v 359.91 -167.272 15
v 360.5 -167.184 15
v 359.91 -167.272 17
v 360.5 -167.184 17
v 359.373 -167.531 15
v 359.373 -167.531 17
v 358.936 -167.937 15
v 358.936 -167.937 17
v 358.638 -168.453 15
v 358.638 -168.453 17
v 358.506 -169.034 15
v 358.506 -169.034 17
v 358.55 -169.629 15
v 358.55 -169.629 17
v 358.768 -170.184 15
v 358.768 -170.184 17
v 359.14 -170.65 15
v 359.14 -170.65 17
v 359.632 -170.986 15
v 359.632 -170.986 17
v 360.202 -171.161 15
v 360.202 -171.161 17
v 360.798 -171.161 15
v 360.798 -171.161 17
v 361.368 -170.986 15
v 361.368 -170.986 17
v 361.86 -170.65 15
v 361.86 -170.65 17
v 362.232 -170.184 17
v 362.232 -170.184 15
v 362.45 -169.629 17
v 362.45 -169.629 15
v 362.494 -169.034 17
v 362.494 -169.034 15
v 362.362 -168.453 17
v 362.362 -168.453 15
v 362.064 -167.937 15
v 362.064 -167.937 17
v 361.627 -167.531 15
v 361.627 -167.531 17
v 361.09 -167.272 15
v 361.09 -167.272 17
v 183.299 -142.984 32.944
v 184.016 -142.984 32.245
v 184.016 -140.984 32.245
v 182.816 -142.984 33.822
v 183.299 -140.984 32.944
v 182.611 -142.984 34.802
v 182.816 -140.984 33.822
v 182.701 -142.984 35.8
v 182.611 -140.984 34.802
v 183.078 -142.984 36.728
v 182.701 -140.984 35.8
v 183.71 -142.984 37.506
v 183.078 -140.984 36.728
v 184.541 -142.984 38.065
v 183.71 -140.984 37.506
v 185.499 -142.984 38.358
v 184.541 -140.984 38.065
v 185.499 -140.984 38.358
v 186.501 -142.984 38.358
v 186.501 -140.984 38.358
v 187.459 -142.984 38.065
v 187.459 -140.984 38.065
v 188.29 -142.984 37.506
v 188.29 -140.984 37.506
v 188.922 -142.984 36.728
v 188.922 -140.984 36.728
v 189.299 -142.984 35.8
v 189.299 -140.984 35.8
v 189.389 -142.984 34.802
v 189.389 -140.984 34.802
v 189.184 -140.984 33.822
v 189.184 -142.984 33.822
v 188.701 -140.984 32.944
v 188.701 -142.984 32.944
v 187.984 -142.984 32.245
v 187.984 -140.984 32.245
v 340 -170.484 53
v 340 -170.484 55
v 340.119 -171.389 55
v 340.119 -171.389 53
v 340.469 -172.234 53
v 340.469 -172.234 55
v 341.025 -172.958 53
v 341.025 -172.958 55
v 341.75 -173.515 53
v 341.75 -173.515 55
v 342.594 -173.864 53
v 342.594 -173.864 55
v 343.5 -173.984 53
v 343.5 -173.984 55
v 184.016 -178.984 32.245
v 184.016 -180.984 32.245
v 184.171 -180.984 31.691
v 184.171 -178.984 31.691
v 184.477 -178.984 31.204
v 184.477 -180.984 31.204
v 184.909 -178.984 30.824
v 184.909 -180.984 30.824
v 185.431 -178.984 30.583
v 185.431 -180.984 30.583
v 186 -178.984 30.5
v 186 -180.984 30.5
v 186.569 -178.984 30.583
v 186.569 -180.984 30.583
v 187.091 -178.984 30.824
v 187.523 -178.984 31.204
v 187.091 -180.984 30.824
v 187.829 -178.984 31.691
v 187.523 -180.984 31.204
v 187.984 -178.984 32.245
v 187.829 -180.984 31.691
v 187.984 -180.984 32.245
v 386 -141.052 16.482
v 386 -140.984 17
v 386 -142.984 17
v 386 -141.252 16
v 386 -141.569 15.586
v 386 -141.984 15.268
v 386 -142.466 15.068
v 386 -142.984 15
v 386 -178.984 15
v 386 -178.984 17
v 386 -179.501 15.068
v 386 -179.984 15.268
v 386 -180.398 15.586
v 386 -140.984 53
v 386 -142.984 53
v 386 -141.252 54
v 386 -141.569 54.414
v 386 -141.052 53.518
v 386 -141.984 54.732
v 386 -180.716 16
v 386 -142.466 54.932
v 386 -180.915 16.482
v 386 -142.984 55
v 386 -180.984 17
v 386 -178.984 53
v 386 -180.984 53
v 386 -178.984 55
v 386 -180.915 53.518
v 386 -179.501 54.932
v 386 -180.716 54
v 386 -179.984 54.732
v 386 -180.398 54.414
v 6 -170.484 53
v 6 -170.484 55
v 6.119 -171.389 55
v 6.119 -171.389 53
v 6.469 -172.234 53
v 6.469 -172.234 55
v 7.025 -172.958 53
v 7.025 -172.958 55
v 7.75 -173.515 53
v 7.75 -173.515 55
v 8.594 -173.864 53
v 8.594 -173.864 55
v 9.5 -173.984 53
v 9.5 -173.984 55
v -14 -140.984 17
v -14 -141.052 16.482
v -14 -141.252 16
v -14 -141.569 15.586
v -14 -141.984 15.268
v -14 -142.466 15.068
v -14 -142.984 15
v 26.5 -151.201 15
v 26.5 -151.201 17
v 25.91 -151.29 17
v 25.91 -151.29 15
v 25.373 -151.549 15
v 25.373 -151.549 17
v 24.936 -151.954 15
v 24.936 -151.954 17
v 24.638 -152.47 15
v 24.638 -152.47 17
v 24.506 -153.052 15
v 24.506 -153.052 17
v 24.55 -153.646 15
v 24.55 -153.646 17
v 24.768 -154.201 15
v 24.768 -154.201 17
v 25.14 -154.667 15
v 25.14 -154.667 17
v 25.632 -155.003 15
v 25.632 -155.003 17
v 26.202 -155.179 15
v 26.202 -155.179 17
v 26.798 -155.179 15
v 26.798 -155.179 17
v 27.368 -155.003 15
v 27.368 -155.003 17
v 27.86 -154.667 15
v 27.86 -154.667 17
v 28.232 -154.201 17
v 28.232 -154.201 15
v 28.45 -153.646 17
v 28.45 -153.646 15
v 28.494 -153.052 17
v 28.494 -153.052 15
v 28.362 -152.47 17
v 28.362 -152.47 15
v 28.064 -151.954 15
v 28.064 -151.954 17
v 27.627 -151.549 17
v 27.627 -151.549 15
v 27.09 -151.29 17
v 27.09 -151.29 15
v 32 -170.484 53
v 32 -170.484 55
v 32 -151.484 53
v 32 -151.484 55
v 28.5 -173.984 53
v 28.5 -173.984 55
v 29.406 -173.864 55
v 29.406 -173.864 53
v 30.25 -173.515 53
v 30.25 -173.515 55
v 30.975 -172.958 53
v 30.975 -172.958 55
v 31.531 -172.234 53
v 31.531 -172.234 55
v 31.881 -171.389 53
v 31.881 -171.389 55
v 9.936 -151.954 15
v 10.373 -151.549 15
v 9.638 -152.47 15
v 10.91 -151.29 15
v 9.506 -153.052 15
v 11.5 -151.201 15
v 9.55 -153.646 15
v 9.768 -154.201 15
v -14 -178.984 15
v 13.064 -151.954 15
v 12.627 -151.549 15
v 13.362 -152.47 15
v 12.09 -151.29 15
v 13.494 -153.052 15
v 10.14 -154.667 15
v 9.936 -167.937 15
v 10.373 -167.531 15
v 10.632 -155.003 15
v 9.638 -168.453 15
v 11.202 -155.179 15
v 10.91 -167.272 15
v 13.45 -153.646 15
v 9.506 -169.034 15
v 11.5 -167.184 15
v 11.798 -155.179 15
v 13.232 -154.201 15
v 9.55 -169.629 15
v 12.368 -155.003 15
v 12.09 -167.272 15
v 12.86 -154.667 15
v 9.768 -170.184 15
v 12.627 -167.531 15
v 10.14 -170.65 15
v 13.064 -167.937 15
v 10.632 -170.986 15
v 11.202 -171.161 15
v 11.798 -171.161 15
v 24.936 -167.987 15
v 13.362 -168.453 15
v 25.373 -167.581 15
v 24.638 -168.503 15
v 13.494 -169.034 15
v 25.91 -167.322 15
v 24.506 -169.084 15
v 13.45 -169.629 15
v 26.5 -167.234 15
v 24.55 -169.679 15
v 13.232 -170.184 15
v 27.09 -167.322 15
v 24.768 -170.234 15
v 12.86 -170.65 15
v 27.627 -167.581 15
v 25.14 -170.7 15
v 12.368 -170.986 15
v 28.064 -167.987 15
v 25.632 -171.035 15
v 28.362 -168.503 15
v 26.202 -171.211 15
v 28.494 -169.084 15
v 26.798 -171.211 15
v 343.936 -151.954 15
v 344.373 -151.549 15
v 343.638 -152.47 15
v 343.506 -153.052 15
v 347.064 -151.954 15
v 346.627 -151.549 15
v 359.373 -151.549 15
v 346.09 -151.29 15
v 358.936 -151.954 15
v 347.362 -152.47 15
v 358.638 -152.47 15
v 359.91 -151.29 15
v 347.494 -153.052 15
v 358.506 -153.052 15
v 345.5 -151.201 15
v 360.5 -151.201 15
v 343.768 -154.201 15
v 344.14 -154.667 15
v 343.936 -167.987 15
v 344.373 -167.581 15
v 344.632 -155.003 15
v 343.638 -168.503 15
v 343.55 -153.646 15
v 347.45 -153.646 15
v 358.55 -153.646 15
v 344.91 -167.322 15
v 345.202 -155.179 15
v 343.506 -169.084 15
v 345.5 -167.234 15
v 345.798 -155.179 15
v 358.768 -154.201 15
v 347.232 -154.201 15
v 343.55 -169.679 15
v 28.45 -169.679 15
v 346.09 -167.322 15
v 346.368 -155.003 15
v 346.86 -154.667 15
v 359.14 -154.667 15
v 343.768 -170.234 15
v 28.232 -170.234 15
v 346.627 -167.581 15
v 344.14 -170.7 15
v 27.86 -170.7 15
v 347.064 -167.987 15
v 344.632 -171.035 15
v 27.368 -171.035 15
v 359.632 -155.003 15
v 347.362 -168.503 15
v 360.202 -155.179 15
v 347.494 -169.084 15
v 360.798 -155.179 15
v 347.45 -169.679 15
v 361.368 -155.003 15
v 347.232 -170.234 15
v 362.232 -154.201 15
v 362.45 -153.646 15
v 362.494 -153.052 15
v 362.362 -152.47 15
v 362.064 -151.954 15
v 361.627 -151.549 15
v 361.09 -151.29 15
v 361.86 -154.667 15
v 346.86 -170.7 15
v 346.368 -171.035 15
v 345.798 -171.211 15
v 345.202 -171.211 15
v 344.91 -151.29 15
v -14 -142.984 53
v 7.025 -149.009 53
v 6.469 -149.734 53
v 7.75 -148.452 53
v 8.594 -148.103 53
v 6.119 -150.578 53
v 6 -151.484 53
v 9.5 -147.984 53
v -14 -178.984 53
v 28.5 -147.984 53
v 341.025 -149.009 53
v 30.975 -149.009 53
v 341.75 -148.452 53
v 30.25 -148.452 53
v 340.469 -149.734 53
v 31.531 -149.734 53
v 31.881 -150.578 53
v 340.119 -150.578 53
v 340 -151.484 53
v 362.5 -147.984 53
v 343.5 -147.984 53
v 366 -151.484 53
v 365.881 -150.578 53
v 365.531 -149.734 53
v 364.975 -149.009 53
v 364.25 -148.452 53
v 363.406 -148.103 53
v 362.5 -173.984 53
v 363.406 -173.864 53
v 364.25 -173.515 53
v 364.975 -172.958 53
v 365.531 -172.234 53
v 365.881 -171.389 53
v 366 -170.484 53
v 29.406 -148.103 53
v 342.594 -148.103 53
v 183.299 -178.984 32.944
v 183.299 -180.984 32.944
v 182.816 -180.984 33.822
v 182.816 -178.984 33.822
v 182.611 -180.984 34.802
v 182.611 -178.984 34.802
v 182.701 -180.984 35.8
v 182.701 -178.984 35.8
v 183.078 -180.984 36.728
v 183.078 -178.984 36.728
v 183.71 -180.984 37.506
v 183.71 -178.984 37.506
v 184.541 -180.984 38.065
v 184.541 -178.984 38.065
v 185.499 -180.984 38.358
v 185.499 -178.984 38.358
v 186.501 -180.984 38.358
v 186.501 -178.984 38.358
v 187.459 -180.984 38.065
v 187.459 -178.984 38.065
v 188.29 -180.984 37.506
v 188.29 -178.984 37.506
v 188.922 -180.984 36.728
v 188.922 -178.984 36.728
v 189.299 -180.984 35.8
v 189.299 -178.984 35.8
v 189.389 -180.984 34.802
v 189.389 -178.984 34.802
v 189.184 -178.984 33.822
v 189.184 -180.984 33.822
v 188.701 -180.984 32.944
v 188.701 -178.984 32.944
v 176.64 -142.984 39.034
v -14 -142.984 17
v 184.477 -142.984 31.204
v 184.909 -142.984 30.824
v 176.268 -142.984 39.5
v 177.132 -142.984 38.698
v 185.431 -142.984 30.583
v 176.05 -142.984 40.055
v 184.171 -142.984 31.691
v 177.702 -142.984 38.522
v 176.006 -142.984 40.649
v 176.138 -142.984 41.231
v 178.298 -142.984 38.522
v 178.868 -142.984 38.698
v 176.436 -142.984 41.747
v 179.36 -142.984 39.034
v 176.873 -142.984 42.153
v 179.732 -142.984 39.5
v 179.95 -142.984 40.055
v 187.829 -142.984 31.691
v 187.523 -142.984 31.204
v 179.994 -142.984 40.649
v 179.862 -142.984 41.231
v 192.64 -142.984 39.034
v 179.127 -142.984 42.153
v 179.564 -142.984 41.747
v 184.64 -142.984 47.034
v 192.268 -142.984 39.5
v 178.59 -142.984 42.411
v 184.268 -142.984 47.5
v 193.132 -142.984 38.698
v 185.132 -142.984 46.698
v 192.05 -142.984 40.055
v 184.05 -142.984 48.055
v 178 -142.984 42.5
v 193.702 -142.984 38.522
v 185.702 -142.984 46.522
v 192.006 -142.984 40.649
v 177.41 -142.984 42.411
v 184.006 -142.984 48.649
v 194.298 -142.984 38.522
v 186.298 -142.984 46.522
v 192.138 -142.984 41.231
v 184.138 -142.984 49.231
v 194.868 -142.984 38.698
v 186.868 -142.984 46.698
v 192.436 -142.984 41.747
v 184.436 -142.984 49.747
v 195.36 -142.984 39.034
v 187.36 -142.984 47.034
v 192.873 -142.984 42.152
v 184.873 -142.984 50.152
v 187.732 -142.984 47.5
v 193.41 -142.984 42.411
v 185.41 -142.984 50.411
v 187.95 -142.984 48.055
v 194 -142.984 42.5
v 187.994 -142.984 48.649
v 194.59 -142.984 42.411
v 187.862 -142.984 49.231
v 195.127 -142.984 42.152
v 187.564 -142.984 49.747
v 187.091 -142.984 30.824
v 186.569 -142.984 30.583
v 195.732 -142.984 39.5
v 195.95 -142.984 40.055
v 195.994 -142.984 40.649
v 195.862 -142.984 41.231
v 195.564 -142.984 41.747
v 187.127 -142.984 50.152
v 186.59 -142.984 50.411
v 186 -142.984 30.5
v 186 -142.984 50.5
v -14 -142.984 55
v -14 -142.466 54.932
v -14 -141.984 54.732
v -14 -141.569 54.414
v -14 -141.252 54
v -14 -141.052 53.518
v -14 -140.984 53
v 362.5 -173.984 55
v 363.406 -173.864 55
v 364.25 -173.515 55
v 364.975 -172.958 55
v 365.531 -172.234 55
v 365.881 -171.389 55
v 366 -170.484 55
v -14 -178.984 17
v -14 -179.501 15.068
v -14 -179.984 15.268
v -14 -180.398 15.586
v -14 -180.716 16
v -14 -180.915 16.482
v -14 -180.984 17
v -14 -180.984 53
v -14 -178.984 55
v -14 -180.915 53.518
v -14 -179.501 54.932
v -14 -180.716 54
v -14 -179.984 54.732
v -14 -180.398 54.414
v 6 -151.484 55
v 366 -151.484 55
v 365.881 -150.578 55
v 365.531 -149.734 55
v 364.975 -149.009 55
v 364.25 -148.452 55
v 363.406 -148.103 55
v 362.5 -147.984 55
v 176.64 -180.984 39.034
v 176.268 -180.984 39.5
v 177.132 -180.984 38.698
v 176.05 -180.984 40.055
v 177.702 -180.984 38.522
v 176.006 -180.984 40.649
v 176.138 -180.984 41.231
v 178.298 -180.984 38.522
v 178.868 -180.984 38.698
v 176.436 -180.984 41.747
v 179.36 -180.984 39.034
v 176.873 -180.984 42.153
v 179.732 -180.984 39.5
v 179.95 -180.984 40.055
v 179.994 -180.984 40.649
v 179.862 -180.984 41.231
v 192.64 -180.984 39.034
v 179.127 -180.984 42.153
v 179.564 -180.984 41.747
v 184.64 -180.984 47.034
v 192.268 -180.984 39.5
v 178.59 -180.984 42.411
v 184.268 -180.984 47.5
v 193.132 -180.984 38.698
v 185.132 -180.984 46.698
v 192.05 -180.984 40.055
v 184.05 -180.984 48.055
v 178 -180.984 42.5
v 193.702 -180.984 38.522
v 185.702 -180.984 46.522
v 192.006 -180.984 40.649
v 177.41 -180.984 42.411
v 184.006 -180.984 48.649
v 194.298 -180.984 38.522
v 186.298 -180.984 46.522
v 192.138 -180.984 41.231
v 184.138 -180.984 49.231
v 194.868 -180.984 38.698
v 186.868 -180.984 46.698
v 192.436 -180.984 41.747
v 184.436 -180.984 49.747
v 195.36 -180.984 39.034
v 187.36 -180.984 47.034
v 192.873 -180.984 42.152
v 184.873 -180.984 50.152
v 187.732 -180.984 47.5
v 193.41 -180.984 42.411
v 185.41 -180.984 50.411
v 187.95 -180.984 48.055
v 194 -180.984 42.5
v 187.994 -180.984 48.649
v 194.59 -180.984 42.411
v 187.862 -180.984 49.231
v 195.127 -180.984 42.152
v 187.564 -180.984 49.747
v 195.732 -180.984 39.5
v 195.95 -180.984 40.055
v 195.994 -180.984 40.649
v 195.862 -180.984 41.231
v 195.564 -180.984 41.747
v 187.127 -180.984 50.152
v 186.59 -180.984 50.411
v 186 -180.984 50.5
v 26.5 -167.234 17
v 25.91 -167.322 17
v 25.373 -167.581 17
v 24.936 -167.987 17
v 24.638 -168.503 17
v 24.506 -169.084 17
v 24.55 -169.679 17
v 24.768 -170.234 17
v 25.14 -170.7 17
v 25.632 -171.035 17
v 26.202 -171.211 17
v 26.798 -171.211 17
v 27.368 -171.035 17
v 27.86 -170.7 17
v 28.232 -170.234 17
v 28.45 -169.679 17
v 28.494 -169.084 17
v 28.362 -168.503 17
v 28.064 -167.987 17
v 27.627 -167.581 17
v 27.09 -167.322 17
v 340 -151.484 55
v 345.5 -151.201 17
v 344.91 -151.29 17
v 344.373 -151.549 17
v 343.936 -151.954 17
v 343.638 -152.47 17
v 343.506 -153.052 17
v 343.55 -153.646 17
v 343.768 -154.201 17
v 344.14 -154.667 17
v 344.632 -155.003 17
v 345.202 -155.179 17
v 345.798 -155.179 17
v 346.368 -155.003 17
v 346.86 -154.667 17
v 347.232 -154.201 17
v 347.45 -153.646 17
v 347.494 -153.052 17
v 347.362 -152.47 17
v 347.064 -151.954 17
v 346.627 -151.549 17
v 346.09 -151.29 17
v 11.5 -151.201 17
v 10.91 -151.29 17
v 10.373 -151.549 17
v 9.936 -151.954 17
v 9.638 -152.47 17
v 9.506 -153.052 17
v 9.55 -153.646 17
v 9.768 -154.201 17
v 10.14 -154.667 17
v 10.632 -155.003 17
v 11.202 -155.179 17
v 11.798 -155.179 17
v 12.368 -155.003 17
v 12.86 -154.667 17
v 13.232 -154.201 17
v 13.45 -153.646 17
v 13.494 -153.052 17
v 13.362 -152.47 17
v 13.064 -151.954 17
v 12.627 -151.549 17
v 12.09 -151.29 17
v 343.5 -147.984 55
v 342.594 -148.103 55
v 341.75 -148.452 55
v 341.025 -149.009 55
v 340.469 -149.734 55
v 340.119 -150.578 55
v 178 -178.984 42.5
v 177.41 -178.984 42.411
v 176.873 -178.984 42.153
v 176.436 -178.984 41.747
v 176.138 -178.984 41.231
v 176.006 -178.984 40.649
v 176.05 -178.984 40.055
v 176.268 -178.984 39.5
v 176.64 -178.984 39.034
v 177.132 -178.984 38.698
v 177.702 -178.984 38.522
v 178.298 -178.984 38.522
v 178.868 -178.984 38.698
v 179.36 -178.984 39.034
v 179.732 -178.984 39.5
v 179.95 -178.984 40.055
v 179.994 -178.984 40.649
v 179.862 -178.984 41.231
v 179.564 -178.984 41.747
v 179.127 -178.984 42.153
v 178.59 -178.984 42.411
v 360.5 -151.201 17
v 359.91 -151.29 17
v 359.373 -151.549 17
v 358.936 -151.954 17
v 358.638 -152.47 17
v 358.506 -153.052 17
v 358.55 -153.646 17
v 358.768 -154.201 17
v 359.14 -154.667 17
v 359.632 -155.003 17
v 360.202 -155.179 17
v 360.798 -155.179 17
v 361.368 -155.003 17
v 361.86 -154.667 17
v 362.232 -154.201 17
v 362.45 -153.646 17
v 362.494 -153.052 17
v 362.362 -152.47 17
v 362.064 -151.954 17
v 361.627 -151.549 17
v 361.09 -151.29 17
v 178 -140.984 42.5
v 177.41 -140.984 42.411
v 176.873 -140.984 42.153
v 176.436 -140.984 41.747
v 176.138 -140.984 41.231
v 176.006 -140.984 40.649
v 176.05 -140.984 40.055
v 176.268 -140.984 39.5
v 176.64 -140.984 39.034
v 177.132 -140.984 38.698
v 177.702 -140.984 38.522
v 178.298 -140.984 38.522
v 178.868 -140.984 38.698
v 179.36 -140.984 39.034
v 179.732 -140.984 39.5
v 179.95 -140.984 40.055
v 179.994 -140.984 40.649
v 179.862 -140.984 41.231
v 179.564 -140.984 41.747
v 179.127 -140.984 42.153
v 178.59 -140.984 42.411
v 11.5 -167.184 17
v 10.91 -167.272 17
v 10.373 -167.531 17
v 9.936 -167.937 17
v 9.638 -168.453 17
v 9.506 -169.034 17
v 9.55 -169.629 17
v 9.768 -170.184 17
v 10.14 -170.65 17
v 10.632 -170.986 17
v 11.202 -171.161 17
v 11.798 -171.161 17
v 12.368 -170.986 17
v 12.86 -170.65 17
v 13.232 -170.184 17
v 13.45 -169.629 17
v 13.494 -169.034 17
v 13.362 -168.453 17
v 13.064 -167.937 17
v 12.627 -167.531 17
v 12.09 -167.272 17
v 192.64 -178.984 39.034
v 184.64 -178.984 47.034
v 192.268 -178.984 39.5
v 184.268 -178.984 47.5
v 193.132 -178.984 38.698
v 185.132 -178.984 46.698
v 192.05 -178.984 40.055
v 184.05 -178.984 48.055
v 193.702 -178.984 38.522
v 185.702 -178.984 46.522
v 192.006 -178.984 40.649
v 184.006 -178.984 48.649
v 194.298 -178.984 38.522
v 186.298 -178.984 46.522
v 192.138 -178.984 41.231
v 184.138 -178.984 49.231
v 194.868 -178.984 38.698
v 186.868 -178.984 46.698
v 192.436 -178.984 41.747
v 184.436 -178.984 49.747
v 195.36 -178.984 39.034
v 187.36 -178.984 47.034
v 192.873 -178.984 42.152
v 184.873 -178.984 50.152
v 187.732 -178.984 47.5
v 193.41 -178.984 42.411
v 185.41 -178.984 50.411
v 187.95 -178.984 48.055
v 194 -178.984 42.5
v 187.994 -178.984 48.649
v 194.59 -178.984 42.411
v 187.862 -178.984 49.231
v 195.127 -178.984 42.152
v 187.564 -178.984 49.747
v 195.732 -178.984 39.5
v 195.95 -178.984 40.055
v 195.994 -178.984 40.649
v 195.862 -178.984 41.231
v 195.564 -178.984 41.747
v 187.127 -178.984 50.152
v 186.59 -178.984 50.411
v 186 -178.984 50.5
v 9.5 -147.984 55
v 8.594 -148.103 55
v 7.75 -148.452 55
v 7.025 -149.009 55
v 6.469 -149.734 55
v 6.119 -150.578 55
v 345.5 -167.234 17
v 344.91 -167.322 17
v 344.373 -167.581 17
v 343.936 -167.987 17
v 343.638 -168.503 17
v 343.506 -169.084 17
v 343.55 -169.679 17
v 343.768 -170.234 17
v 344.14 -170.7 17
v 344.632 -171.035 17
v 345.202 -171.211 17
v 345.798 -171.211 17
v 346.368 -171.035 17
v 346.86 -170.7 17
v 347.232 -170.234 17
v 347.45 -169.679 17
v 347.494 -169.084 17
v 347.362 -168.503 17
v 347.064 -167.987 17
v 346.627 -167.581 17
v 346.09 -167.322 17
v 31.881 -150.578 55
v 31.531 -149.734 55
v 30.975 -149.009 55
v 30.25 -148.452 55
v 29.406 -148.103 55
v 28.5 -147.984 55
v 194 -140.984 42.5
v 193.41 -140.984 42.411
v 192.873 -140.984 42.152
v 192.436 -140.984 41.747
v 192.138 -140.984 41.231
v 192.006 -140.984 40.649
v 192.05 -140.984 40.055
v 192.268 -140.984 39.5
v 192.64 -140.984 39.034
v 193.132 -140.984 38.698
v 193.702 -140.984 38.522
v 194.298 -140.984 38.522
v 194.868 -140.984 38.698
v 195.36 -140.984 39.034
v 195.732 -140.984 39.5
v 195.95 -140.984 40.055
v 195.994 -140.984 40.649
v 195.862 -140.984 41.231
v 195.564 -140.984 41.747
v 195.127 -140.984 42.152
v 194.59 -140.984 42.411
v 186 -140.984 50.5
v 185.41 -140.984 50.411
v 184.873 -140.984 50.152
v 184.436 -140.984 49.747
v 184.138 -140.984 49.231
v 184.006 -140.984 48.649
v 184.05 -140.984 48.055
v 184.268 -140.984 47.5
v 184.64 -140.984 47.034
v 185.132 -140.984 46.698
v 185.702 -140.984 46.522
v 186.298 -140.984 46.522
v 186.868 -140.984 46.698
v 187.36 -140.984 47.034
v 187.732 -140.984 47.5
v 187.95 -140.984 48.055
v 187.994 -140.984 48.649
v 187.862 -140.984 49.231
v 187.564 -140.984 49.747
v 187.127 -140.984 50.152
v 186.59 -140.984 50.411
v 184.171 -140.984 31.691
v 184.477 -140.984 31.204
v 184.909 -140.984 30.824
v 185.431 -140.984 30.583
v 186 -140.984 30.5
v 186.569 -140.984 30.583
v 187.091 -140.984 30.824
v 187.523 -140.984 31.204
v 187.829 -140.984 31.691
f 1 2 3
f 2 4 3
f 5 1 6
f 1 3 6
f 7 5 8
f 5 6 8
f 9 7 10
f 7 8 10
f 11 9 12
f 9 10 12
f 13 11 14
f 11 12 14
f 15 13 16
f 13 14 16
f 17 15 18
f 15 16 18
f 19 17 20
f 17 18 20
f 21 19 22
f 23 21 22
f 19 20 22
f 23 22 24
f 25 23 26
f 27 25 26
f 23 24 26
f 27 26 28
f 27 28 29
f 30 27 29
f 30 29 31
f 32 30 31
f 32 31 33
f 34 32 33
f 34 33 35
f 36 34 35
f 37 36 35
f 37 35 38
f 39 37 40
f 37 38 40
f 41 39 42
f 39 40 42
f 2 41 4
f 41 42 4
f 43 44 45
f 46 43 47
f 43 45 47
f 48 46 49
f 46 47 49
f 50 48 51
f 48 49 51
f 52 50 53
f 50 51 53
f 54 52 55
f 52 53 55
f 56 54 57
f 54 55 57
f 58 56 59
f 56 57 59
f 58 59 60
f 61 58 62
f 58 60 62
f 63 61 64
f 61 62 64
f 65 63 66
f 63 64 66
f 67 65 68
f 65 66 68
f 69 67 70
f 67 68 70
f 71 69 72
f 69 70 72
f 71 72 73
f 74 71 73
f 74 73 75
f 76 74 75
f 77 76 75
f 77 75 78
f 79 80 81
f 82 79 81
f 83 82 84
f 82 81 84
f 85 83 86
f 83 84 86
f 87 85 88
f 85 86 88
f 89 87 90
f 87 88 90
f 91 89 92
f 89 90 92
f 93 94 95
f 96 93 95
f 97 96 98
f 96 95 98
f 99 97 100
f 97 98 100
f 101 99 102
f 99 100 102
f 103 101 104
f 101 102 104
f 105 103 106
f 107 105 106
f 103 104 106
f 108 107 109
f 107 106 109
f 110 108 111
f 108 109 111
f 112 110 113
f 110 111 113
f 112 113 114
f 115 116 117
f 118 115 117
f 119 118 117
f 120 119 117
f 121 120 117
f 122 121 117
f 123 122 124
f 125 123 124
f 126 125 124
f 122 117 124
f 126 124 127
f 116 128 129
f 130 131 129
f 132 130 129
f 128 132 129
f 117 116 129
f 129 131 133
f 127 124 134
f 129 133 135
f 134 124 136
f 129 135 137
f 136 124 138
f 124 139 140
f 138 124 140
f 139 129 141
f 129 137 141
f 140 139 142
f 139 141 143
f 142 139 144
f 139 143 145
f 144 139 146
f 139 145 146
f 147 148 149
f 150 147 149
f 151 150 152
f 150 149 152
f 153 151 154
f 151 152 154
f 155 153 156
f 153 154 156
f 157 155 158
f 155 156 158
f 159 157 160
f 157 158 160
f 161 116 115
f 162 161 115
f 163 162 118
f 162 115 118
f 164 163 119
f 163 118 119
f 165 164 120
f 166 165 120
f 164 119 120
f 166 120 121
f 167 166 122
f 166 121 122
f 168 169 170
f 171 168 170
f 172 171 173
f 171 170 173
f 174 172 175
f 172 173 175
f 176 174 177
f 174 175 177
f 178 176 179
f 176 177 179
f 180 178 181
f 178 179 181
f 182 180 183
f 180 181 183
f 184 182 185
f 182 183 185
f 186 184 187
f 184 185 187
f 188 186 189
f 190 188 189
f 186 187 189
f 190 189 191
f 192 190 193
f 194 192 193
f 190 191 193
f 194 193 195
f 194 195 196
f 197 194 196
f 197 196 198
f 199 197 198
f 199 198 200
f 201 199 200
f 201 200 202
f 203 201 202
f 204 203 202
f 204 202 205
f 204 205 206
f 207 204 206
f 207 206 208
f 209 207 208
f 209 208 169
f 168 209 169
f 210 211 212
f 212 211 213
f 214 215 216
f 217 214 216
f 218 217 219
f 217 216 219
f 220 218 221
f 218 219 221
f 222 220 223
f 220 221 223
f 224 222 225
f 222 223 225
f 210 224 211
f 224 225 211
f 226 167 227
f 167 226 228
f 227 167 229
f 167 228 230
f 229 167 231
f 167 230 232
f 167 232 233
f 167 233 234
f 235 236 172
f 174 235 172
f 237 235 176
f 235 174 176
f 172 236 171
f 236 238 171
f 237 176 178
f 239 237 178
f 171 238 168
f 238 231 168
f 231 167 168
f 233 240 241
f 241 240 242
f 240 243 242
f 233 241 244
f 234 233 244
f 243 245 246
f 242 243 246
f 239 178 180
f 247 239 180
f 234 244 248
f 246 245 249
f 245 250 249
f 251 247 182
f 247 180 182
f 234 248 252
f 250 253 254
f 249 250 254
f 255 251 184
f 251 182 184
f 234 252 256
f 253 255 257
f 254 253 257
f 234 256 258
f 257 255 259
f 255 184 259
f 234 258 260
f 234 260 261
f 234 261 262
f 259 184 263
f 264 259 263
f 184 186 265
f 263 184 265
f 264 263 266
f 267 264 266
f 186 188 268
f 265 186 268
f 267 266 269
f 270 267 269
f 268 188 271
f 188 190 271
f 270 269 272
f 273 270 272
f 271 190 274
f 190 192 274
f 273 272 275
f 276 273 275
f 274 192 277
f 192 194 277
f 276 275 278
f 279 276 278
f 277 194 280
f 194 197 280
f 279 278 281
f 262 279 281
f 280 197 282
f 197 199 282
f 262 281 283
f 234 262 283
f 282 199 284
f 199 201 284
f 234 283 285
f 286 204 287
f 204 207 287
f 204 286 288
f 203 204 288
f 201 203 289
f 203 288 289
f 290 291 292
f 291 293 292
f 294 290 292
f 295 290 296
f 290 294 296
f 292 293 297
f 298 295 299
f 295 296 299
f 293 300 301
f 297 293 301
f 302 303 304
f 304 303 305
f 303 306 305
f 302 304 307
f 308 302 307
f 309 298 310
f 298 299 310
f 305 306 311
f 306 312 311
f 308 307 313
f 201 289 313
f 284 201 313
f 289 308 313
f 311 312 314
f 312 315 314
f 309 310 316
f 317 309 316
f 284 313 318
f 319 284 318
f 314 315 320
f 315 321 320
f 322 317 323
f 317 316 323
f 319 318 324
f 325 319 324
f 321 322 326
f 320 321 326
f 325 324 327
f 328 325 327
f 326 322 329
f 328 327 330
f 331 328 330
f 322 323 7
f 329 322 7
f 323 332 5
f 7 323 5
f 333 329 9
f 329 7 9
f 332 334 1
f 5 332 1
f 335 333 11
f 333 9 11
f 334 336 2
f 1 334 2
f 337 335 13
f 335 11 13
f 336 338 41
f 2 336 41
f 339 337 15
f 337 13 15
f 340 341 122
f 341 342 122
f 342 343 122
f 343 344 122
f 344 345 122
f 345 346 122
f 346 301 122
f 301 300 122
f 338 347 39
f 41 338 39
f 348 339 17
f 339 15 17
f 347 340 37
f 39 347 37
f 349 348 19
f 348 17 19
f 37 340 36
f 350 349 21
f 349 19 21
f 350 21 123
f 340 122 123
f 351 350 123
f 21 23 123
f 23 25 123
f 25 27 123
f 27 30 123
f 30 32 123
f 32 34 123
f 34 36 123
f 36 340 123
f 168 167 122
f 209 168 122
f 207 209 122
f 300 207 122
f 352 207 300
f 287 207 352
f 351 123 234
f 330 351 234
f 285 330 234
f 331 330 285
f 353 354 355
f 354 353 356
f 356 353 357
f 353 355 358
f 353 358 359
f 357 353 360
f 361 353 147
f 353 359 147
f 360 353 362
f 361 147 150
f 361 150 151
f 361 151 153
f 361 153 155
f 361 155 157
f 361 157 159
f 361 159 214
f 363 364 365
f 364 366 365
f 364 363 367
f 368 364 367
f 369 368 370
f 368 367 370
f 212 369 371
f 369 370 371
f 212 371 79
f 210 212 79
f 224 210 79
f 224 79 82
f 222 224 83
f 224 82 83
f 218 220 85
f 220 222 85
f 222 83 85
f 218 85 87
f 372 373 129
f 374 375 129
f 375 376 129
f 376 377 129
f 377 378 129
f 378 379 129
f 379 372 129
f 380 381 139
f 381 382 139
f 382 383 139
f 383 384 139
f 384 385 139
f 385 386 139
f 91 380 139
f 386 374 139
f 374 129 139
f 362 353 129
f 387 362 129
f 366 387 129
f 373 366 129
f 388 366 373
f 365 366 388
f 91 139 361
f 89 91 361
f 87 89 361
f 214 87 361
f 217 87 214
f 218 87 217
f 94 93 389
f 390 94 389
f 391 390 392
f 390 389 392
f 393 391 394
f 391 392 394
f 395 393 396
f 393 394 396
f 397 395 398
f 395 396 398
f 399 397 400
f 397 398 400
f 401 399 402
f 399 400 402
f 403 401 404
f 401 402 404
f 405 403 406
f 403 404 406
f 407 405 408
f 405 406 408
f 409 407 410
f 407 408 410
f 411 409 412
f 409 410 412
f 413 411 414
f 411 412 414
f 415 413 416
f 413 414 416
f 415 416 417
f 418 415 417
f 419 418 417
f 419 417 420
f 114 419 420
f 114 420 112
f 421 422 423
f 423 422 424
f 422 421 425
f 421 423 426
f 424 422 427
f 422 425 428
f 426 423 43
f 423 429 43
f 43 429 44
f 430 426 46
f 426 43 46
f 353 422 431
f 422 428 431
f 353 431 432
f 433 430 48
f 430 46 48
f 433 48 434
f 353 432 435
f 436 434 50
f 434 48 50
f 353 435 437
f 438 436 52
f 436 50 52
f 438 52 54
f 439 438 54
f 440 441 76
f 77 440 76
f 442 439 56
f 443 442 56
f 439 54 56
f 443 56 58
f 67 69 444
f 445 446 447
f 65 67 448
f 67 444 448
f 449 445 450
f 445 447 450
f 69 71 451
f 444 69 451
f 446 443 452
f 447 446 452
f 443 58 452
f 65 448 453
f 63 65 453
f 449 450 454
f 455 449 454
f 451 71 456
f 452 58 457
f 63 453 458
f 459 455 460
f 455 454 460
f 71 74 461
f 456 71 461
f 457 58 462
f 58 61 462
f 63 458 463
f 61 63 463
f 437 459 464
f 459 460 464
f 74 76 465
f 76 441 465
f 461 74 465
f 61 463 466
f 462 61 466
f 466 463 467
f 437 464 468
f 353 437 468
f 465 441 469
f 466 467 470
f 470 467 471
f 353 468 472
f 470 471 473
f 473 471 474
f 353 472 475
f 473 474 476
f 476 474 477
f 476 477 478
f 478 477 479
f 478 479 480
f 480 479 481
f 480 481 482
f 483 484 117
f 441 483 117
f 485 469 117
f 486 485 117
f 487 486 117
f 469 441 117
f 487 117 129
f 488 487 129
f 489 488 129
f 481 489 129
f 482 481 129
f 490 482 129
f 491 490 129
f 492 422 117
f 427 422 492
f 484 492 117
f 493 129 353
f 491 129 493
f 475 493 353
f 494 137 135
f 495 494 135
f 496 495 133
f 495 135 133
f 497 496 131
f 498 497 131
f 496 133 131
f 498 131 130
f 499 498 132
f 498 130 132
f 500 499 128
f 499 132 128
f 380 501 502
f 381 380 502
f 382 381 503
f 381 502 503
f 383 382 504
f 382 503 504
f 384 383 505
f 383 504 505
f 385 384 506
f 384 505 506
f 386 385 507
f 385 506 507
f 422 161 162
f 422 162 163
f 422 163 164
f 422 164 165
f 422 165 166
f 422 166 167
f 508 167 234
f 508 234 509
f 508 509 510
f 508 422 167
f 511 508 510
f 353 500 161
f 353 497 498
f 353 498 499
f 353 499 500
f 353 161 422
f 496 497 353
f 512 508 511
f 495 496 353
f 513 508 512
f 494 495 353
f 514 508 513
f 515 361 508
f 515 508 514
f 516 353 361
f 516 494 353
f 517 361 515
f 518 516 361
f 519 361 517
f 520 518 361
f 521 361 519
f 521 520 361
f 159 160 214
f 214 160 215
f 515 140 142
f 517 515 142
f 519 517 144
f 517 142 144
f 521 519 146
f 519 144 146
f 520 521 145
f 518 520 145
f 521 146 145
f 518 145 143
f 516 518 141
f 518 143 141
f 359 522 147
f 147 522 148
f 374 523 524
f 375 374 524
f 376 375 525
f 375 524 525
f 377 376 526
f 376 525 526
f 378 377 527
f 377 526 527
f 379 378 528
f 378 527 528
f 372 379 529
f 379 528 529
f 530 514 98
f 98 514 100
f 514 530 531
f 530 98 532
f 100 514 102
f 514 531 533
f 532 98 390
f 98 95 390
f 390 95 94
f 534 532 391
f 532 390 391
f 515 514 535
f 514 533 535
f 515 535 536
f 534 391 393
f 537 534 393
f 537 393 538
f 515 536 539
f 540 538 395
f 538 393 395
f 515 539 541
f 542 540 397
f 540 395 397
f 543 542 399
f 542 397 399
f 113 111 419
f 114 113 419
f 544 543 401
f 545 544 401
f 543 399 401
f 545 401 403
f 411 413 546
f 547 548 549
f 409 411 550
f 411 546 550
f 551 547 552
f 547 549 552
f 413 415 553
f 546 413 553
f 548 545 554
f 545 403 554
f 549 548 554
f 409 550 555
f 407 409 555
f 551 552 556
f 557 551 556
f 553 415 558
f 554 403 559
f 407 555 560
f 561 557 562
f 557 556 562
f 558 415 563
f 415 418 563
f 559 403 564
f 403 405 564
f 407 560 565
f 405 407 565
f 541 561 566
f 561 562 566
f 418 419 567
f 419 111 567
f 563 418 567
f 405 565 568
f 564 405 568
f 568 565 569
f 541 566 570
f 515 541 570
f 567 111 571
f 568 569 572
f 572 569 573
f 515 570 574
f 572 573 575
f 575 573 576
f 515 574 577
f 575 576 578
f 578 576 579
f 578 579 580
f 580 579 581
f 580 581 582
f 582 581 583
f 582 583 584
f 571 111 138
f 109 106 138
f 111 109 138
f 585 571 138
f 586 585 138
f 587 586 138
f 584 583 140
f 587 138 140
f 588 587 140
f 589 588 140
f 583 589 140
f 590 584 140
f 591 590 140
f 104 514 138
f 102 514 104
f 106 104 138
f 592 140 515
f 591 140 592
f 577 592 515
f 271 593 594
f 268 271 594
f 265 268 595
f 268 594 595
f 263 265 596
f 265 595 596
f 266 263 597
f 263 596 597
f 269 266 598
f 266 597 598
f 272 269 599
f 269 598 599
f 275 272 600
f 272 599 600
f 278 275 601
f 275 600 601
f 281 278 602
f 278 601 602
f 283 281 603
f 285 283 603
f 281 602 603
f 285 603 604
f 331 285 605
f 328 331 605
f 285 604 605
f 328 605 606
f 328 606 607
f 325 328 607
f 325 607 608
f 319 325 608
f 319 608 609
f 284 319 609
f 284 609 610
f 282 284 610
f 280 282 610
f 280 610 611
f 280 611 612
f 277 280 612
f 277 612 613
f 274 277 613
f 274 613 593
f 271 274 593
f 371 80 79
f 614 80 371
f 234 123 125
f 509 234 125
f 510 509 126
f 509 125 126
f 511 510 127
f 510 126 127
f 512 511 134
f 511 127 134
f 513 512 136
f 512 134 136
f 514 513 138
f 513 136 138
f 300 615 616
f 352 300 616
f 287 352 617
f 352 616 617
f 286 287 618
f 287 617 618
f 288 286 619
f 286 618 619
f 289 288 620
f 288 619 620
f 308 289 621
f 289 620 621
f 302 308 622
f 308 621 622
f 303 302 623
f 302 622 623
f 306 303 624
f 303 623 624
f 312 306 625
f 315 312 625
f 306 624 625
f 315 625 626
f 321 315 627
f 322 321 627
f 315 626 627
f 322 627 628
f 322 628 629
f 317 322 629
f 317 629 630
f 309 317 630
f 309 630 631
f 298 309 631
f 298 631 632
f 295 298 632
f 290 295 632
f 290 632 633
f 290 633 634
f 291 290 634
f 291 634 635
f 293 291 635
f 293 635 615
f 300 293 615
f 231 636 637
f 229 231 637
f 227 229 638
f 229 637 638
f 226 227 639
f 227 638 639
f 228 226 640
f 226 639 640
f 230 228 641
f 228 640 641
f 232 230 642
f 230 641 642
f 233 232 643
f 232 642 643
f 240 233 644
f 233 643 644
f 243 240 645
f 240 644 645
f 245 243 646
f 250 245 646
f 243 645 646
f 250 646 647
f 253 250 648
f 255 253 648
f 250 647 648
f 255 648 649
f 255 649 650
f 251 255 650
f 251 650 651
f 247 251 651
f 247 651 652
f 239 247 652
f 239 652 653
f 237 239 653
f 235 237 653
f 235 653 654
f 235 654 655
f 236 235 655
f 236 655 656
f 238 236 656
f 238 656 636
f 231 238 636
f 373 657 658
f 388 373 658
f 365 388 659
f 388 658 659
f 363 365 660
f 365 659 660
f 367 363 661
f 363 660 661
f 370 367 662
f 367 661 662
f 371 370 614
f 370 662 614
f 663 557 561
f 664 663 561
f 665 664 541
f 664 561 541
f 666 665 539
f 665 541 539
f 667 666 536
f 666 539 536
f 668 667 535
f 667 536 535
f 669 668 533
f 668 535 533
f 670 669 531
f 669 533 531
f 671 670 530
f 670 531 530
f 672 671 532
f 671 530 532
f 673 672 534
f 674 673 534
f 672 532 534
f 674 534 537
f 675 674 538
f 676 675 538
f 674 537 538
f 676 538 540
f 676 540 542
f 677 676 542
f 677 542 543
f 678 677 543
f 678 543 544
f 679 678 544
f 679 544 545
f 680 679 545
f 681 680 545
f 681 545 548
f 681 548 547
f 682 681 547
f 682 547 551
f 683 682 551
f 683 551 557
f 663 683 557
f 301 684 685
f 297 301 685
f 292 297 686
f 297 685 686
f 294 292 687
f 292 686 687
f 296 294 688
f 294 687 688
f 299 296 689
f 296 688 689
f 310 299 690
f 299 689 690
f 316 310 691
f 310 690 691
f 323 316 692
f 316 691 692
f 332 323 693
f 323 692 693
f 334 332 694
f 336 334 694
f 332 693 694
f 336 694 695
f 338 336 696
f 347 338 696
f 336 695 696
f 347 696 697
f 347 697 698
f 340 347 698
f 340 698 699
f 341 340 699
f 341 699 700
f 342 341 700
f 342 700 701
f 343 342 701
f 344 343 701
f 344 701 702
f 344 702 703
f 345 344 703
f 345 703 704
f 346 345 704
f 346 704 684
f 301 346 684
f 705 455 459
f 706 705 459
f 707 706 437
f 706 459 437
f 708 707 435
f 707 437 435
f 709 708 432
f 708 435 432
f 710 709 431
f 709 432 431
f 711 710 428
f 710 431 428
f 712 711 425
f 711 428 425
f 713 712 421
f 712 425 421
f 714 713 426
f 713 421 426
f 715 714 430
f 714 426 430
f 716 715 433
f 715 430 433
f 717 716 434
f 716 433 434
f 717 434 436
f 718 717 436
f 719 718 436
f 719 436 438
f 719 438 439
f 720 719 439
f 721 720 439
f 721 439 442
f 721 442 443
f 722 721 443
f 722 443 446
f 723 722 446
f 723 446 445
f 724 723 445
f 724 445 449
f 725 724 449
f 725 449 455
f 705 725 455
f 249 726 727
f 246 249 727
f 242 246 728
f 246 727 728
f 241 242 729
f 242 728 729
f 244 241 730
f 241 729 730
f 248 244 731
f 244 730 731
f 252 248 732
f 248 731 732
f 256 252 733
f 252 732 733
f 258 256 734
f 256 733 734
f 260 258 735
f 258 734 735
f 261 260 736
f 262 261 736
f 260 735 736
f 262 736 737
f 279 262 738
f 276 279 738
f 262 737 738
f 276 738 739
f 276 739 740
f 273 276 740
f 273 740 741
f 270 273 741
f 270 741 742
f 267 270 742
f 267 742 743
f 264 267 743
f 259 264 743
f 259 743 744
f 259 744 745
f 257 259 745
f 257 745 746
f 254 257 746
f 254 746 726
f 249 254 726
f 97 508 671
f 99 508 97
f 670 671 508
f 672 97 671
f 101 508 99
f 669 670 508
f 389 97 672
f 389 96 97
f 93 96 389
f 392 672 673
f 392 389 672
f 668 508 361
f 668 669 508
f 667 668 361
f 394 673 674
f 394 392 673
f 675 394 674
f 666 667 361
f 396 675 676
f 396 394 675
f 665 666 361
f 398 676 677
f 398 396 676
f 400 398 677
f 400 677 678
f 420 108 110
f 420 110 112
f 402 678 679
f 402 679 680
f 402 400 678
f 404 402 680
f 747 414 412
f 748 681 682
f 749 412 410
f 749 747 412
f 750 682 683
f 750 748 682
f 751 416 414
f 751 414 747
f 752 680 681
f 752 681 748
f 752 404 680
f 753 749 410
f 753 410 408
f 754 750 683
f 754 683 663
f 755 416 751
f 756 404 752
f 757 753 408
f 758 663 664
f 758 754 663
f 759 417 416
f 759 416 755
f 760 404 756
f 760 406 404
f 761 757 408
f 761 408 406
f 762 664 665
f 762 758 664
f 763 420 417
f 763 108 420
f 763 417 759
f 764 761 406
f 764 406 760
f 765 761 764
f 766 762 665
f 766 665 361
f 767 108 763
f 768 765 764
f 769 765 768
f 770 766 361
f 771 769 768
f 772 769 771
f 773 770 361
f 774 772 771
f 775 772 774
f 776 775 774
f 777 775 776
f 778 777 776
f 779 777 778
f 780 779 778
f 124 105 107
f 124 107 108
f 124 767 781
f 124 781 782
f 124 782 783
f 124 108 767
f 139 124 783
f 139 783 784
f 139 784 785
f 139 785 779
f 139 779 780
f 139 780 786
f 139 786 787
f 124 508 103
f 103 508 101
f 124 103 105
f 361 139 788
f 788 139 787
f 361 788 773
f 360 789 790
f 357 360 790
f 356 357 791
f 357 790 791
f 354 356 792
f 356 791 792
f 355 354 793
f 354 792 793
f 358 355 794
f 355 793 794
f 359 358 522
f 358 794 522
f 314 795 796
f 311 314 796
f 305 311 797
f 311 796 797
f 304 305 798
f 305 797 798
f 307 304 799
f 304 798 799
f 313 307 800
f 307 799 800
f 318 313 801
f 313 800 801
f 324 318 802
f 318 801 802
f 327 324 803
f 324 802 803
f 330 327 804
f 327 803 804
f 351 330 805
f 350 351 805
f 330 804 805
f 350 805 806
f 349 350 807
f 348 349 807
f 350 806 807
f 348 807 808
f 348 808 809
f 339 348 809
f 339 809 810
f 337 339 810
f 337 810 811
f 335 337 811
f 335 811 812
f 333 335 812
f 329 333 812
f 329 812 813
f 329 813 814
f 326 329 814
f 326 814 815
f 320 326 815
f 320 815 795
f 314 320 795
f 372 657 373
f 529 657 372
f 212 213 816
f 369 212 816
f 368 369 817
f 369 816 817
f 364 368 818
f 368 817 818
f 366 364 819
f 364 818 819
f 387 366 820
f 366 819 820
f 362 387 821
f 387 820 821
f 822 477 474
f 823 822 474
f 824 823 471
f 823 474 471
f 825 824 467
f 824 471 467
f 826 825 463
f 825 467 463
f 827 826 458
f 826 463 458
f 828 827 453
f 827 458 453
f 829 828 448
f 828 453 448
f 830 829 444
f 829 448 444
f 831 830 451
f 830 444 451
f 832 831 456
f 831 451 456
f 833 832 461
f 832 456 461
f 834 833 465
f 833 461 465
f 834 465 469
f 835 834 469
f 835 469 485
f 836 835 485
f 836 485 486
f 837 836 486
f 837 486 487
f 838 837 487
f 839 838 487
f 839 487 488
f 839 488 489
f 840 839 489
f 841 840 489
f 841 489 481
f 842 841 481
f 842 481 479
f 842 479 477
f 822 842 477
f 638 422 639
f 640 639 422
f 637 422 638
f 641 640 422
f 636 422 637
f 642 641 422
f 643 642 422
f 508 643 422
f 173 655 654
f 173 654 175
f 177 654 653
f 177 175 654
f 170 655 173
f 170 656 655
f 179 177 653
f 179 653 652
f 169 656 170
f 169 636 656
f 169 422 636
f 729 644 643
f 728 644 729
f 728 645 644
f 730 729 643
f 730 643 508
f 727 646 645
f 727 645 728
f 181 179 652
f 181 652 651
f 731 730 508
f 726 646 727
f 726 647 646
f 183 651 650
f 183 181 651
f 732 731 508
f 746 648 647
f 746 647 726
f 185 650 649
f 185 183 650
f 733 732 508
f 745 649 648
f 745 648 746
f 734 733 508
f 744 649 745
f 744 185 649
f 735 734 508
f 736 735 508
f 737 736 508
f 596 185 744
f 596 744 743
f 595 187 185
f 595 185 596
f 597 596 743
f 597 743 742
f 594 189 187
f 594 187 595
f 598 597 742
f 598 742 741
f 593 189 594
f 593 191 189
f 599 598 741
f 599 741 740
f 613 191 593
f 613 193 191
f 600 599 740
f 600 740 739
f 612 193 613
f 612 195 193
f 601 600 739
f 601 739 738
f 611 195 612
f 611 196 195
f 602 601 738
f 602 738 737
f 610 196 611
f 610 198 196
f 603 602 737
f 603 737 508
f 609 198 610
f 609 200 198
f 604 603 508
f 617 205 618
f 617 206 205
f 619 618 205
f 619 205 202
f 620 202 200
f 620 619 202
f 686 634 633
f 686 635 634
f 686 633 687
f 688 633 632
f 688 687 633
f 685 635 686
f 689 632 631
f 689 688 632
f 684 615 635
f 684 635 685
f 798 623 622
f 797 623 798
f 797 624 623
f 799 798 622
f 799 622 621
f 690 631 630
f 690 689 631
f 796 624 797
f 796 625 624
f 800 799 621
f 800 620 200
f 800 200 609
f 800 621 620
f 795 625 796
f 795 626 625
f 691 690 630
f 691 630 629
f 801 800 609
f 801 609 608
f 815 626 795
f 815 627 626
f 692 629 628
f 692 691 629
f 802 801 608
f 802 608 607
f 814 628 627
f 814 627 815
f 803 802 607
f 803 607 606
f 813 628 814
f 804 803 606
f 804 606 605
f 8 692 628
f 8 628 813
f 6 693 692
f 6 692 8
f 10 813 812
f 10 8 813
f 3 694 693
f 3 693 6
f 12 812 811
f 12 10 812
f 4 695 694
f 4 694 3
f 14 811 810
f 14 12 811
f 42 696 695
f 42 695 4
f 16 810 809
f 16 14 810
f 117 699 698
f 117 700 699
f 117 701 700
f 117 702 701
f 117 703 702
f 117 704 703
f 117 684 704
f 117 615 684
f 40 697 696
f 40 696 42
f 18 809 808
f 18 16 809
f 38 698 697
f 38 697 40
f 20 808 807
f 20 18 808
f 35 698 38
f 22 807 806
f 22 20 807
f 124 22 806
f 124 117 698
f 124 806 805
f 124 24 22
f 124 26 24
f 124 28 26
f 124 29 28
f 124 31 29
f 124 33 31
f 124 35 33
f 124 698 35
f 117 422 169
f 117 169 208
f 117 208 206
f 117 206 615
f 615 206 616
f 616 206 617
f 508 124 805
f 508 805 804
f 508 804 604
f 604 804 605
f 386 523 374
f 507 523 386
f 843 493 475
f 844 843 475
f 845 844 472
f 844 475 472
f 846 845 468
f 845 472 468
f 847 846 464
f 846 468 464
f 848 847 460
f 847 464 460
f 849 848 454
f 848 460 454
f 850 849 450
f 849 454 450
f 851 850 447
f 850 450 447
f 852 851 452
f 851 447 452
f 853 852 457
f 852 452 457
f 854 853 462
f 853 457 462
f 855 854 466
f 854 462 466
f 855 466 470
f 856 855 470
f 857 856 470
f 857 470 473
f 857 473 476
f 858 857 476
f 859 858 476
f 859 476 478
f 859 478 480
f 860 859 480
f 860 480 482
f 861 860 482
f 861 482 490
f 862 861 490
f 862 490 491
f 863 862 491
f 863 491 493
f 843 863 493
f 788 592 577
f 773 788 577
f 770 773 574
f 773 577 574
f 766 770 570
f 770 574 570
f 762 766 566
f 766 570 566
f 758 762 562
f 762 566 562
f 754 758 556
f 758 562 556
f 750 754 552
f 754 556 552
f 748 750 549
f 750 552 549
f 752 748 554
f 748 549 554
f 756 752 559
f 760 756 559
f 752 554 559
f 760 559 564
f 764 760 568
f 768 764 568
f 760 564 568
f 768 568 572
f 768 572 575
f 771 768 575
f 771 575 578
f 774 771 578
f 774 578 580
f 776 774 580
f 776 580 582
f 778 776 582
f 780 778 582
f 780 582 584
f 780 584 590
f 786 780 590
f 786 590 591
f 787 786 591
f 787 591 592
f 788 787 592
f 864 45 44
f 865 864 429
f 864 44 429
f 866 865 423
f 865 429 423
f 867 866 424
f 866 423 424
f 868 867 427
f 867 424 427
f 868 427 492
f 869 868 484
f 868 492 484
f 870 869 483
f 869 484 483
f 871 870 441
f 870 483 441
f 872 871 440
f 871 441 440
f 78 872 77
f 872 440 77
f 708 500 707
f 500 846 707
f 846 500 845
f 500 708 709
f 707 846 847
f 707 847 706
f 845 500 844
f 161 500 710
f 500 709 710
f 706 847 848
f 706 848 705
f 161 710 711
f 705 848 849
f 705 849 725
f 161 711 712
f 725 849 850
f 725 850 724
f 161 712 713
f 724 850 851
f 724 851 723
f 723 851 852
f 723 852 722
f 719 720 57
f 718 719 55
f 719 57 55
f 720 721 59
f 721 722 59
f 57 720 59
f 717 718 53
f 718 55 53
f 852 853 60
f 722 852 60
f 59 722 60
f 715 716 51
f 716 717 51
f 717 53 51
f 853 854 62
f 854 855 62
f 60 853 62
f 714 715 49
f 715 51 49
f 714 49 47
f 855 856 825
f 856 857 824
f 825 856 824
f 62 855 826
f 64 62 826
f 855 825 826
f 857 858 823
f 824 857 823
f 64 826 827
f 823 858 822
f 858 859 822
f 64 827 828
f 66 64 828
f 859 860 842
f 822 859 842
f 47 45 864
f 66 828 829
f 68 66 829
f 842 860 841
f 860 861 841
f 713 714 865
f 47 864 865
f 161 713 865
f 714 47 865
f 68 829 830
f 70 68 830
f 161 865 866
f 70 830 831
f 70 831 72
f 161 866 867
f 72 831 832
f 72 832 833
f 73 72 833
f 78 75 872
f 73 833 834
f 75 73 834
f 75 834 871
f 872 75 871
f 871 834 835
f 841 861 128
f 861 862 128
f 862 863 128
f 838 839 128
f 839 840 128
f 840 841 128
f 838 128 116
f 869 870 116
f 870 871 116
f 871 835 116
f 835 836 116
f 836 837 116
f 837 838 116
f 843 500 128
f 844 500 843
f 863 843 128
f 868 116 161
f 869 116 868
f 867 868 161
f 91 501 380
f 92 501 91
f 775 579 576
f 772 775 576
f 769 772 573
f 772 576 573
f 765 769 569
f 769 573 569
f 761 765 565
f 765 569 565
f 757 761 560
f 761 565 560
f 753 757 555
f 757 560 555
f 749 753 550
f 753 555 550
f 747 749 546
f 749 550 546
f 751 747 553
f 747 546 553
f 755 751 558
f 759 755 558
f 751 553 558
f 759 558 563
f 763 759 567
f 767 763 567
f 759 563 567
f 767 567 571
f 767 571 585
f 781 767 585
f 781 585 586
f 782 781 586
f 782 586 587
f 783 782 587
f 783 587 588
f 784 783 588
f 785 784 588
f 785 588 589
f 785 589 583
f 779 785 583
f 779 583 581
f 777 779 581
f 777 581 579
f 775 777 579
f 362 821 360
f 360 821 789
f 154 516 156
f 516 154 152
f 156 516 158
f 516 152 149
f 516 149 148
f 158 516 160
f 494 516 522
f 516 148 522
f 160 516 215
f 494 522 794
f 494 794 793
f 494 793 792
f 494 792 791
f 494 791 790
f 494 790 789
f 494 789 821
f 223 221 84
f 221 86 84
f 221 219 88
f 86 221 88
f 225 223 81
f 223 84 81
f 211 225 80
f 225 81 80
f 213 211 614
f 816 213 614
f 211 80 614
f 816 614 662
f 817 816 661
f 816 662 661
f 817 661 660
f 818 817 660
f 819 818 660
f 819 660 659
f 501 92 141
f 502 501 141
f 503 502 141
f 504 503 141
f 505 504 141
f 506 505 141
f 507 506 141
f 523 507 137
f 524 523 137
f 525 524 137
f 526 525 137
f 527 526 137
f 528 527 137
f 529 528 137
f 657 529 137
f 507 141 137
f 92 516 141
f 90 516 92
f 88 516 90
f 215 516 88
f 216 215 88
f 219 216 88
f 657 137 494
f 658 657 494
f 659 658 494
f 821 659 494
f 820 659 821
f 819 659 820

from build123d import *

# Parameters (mm, degrees)
SKETCH022_W             = 36
SKETCH022_H             = 36
PAD020_DEPTH            = 400
SKETCH023_R             = 3.395011
POCKET002_DEPTH         = 40
SKETCH024_R             = 2
POCKET003_DEPTH         = 25
POCKET004_DEPTH         = 5
SKETCH026_R             = 2
POCKET005_DEPTH         = 40
POCKET006_DEPTH         = 50
BODY018_PLACEMENT_ANGLE = 270


with BuildPart() as part:
    # Sketch022 → Pad020 (new body)
    with BuildSketch(Plane.XZ):
        with BuildLine():
            Line((0, -2), (0, -38))
            ThreePointArc((0, -38), (0.585786, -39.414214), (2, -40))
            Line((2, -40), (38, -40))
            ThreePointArc((38, -40), (39.414214, -39.414214), (40, -38))
            Line((40, -38), (40, -2))
            ThreePointArc((40, -2), (39.414214, -0.585786), (38, 0))
            Line((38, 0), (2, 0))
            ThreePointArc((2, 0), (0.585786, -0.585786), (0, -2))
        make_face()
        with Locations((20, -20)):
            Rectangle(SKETCH022_W, SKETCH022_H, mode=Mode.SUBTRACT)
    extrude(amount=PAD020_DEPTH)

    # Sketch023 (on Face1 of Pad020) → Pocket002 (cut)
    with BuildSketch(Plane(origin=(0, 0, 0), x_dir=(0, 0, -1), z_dir=(-1, 0, 0))):
        with Locations((20, 200)):
            Circle(SKETCH023_R)
    extrude(amount=-POCKET002_DEPTH, mode=Mode.SUBTRACT)

    # Sketch024 (on Face13 of Pocket002) → Pocket003 (cut, symmetric)
    with BuildSketch(Plane(origin=(0, 0, -38), x_dir=(-1, 0, 0), z_dir=(0, 0, 1))):
        with Locations((-28.25, 359.5)):
            Circle(SKETCH024_R)
        with Locations((-12.217429, 359.5)):
            Circle(SKETCH024_R)
        with Locations((-12.217429, 374.5)):
            Circle(SKETCH024_R)
        with Locations((-28.20008, 374.5)):
            Circle(SKETCH024_R)
        with Locations((-28.25, 40.5)):
            Circle(SKETCH024_R)
        with Locations((-12.217429, 40.5)):
            Circle(SKETCH024_R)
        with Locations((-12.217429, 25.5)):
            Circle(SKETCH024_R)
        with Locations((-28.20008, 25.5)):
            Circle(SKETCH024_R)
    extrude(amount=POCKET003_DEPTH, both=True, mode=Mode.SUBTRACT)

    # Sketch025 (on Face7 of Pocket003) → Pocket004 (cut)
    with BuildSketch(Plane(origin=(0, 0, 0), x_dir=(-1, 0, 0), z_dir=(0, 0, 1))):
        with BuildLine():
            Line((-33, 376.5), (-33, 357.5))
            ThreePointArc((-33, 357.5), (-31.974874, 355.025126), (-29.5, 354))
            Line((-29.5, 354), (-10.5, 354))
            ThreePointArc((-10.5, 354), (-8.025126, 355.025126), (-7, 357.5))
            Line((-7, 357.5), (-7, 376.5))
            ThreePointArc((-7, 376.5), (-8.025126, 378.974874), (-10.5, 380))
            Line((-10.5, 380), (-29.5, 380))
            ThreePointArc((-29.5, 380), (-31.974874, 378.974874), (-33, 376.5))
        make_face()
        with BuildLine():
            Line((-33, 23.5), (-33, 42.5))
            ThreePointArc((-29.5, 46), (-31.974874, 44.974874), (-33, 42.5))
            Line((-29.5, 46), (-10.5, 46))
            ThreePointArc((-7, 42.5), (-8.025126, 44.974874), (-10.5, 46))
            Line((-7, 42.5), (-7, 23.5))
            ThreePointArc((-10.5, 20), (-8.025126, 21.025126), (-7, 23.5))
            Line((-10.5, 20), (-29.5, 20))
            ThreePointArc((-33, 23.5), (-31.974874, 21.025126), (-29.5, 20))
        make_face()
    extrude(amount=-POCKET004_DEPTH, mode=Mode.SUBTRACT)

    # Sketch026 (on Face10 of Pocket004) → Pocket005 (cut)
    with BuildSketch(Plane(origin=(40, 0, 0), x_dir=(0, 0, 1), z_dir=(1, 0, 0))):
        with Locations((-14.500015, 192)):
            Circle(SKETCH026_R)
        with Locations((-14.499969, 208)):
            Circle(SKETCH026_R)
        with Locations((-6.5, 200)):
            Circle(SKETCH026_R)
        with Locations((-22.5, 200)):
            Circle(SKETCH026_R)
    extrude(amount=-POCKET005_DEPTH, mode=Mode.SUBTRACT)

    # Sketch026 (on Face10 of Pocket004) → Pocket006 (cut)
    with BuildSketch(Plane(origin=(40, 0, 0), x_dir=(0, 0, 1), z_dir=(1, 0, 0))):
        with Locations((-14.500015, 192)):
            Circle(SKETCH026_R)
        with Locations((-14.499969, 208)):
            Circle(SKETCH026_R)
        with Locations((-6.5, 200)):
            Circle(SKETCH026_R)
        with Locations((-22.5, 200)):
            Circle(SKETCH026_R)
    extrude(amount=-POCKET006_DEPTH, mode=Mode.SUBTRACT)


with BuildPart() as part_1:
    # Body018 placement: moved
    add(part.part.moved(Location((386, -140.983559, 55))).rotate(Axis((386, -140.983559, 55), (0, 0, 1)), BODY018_PLACEMENT_ANGLE))


solid = part_1.part
